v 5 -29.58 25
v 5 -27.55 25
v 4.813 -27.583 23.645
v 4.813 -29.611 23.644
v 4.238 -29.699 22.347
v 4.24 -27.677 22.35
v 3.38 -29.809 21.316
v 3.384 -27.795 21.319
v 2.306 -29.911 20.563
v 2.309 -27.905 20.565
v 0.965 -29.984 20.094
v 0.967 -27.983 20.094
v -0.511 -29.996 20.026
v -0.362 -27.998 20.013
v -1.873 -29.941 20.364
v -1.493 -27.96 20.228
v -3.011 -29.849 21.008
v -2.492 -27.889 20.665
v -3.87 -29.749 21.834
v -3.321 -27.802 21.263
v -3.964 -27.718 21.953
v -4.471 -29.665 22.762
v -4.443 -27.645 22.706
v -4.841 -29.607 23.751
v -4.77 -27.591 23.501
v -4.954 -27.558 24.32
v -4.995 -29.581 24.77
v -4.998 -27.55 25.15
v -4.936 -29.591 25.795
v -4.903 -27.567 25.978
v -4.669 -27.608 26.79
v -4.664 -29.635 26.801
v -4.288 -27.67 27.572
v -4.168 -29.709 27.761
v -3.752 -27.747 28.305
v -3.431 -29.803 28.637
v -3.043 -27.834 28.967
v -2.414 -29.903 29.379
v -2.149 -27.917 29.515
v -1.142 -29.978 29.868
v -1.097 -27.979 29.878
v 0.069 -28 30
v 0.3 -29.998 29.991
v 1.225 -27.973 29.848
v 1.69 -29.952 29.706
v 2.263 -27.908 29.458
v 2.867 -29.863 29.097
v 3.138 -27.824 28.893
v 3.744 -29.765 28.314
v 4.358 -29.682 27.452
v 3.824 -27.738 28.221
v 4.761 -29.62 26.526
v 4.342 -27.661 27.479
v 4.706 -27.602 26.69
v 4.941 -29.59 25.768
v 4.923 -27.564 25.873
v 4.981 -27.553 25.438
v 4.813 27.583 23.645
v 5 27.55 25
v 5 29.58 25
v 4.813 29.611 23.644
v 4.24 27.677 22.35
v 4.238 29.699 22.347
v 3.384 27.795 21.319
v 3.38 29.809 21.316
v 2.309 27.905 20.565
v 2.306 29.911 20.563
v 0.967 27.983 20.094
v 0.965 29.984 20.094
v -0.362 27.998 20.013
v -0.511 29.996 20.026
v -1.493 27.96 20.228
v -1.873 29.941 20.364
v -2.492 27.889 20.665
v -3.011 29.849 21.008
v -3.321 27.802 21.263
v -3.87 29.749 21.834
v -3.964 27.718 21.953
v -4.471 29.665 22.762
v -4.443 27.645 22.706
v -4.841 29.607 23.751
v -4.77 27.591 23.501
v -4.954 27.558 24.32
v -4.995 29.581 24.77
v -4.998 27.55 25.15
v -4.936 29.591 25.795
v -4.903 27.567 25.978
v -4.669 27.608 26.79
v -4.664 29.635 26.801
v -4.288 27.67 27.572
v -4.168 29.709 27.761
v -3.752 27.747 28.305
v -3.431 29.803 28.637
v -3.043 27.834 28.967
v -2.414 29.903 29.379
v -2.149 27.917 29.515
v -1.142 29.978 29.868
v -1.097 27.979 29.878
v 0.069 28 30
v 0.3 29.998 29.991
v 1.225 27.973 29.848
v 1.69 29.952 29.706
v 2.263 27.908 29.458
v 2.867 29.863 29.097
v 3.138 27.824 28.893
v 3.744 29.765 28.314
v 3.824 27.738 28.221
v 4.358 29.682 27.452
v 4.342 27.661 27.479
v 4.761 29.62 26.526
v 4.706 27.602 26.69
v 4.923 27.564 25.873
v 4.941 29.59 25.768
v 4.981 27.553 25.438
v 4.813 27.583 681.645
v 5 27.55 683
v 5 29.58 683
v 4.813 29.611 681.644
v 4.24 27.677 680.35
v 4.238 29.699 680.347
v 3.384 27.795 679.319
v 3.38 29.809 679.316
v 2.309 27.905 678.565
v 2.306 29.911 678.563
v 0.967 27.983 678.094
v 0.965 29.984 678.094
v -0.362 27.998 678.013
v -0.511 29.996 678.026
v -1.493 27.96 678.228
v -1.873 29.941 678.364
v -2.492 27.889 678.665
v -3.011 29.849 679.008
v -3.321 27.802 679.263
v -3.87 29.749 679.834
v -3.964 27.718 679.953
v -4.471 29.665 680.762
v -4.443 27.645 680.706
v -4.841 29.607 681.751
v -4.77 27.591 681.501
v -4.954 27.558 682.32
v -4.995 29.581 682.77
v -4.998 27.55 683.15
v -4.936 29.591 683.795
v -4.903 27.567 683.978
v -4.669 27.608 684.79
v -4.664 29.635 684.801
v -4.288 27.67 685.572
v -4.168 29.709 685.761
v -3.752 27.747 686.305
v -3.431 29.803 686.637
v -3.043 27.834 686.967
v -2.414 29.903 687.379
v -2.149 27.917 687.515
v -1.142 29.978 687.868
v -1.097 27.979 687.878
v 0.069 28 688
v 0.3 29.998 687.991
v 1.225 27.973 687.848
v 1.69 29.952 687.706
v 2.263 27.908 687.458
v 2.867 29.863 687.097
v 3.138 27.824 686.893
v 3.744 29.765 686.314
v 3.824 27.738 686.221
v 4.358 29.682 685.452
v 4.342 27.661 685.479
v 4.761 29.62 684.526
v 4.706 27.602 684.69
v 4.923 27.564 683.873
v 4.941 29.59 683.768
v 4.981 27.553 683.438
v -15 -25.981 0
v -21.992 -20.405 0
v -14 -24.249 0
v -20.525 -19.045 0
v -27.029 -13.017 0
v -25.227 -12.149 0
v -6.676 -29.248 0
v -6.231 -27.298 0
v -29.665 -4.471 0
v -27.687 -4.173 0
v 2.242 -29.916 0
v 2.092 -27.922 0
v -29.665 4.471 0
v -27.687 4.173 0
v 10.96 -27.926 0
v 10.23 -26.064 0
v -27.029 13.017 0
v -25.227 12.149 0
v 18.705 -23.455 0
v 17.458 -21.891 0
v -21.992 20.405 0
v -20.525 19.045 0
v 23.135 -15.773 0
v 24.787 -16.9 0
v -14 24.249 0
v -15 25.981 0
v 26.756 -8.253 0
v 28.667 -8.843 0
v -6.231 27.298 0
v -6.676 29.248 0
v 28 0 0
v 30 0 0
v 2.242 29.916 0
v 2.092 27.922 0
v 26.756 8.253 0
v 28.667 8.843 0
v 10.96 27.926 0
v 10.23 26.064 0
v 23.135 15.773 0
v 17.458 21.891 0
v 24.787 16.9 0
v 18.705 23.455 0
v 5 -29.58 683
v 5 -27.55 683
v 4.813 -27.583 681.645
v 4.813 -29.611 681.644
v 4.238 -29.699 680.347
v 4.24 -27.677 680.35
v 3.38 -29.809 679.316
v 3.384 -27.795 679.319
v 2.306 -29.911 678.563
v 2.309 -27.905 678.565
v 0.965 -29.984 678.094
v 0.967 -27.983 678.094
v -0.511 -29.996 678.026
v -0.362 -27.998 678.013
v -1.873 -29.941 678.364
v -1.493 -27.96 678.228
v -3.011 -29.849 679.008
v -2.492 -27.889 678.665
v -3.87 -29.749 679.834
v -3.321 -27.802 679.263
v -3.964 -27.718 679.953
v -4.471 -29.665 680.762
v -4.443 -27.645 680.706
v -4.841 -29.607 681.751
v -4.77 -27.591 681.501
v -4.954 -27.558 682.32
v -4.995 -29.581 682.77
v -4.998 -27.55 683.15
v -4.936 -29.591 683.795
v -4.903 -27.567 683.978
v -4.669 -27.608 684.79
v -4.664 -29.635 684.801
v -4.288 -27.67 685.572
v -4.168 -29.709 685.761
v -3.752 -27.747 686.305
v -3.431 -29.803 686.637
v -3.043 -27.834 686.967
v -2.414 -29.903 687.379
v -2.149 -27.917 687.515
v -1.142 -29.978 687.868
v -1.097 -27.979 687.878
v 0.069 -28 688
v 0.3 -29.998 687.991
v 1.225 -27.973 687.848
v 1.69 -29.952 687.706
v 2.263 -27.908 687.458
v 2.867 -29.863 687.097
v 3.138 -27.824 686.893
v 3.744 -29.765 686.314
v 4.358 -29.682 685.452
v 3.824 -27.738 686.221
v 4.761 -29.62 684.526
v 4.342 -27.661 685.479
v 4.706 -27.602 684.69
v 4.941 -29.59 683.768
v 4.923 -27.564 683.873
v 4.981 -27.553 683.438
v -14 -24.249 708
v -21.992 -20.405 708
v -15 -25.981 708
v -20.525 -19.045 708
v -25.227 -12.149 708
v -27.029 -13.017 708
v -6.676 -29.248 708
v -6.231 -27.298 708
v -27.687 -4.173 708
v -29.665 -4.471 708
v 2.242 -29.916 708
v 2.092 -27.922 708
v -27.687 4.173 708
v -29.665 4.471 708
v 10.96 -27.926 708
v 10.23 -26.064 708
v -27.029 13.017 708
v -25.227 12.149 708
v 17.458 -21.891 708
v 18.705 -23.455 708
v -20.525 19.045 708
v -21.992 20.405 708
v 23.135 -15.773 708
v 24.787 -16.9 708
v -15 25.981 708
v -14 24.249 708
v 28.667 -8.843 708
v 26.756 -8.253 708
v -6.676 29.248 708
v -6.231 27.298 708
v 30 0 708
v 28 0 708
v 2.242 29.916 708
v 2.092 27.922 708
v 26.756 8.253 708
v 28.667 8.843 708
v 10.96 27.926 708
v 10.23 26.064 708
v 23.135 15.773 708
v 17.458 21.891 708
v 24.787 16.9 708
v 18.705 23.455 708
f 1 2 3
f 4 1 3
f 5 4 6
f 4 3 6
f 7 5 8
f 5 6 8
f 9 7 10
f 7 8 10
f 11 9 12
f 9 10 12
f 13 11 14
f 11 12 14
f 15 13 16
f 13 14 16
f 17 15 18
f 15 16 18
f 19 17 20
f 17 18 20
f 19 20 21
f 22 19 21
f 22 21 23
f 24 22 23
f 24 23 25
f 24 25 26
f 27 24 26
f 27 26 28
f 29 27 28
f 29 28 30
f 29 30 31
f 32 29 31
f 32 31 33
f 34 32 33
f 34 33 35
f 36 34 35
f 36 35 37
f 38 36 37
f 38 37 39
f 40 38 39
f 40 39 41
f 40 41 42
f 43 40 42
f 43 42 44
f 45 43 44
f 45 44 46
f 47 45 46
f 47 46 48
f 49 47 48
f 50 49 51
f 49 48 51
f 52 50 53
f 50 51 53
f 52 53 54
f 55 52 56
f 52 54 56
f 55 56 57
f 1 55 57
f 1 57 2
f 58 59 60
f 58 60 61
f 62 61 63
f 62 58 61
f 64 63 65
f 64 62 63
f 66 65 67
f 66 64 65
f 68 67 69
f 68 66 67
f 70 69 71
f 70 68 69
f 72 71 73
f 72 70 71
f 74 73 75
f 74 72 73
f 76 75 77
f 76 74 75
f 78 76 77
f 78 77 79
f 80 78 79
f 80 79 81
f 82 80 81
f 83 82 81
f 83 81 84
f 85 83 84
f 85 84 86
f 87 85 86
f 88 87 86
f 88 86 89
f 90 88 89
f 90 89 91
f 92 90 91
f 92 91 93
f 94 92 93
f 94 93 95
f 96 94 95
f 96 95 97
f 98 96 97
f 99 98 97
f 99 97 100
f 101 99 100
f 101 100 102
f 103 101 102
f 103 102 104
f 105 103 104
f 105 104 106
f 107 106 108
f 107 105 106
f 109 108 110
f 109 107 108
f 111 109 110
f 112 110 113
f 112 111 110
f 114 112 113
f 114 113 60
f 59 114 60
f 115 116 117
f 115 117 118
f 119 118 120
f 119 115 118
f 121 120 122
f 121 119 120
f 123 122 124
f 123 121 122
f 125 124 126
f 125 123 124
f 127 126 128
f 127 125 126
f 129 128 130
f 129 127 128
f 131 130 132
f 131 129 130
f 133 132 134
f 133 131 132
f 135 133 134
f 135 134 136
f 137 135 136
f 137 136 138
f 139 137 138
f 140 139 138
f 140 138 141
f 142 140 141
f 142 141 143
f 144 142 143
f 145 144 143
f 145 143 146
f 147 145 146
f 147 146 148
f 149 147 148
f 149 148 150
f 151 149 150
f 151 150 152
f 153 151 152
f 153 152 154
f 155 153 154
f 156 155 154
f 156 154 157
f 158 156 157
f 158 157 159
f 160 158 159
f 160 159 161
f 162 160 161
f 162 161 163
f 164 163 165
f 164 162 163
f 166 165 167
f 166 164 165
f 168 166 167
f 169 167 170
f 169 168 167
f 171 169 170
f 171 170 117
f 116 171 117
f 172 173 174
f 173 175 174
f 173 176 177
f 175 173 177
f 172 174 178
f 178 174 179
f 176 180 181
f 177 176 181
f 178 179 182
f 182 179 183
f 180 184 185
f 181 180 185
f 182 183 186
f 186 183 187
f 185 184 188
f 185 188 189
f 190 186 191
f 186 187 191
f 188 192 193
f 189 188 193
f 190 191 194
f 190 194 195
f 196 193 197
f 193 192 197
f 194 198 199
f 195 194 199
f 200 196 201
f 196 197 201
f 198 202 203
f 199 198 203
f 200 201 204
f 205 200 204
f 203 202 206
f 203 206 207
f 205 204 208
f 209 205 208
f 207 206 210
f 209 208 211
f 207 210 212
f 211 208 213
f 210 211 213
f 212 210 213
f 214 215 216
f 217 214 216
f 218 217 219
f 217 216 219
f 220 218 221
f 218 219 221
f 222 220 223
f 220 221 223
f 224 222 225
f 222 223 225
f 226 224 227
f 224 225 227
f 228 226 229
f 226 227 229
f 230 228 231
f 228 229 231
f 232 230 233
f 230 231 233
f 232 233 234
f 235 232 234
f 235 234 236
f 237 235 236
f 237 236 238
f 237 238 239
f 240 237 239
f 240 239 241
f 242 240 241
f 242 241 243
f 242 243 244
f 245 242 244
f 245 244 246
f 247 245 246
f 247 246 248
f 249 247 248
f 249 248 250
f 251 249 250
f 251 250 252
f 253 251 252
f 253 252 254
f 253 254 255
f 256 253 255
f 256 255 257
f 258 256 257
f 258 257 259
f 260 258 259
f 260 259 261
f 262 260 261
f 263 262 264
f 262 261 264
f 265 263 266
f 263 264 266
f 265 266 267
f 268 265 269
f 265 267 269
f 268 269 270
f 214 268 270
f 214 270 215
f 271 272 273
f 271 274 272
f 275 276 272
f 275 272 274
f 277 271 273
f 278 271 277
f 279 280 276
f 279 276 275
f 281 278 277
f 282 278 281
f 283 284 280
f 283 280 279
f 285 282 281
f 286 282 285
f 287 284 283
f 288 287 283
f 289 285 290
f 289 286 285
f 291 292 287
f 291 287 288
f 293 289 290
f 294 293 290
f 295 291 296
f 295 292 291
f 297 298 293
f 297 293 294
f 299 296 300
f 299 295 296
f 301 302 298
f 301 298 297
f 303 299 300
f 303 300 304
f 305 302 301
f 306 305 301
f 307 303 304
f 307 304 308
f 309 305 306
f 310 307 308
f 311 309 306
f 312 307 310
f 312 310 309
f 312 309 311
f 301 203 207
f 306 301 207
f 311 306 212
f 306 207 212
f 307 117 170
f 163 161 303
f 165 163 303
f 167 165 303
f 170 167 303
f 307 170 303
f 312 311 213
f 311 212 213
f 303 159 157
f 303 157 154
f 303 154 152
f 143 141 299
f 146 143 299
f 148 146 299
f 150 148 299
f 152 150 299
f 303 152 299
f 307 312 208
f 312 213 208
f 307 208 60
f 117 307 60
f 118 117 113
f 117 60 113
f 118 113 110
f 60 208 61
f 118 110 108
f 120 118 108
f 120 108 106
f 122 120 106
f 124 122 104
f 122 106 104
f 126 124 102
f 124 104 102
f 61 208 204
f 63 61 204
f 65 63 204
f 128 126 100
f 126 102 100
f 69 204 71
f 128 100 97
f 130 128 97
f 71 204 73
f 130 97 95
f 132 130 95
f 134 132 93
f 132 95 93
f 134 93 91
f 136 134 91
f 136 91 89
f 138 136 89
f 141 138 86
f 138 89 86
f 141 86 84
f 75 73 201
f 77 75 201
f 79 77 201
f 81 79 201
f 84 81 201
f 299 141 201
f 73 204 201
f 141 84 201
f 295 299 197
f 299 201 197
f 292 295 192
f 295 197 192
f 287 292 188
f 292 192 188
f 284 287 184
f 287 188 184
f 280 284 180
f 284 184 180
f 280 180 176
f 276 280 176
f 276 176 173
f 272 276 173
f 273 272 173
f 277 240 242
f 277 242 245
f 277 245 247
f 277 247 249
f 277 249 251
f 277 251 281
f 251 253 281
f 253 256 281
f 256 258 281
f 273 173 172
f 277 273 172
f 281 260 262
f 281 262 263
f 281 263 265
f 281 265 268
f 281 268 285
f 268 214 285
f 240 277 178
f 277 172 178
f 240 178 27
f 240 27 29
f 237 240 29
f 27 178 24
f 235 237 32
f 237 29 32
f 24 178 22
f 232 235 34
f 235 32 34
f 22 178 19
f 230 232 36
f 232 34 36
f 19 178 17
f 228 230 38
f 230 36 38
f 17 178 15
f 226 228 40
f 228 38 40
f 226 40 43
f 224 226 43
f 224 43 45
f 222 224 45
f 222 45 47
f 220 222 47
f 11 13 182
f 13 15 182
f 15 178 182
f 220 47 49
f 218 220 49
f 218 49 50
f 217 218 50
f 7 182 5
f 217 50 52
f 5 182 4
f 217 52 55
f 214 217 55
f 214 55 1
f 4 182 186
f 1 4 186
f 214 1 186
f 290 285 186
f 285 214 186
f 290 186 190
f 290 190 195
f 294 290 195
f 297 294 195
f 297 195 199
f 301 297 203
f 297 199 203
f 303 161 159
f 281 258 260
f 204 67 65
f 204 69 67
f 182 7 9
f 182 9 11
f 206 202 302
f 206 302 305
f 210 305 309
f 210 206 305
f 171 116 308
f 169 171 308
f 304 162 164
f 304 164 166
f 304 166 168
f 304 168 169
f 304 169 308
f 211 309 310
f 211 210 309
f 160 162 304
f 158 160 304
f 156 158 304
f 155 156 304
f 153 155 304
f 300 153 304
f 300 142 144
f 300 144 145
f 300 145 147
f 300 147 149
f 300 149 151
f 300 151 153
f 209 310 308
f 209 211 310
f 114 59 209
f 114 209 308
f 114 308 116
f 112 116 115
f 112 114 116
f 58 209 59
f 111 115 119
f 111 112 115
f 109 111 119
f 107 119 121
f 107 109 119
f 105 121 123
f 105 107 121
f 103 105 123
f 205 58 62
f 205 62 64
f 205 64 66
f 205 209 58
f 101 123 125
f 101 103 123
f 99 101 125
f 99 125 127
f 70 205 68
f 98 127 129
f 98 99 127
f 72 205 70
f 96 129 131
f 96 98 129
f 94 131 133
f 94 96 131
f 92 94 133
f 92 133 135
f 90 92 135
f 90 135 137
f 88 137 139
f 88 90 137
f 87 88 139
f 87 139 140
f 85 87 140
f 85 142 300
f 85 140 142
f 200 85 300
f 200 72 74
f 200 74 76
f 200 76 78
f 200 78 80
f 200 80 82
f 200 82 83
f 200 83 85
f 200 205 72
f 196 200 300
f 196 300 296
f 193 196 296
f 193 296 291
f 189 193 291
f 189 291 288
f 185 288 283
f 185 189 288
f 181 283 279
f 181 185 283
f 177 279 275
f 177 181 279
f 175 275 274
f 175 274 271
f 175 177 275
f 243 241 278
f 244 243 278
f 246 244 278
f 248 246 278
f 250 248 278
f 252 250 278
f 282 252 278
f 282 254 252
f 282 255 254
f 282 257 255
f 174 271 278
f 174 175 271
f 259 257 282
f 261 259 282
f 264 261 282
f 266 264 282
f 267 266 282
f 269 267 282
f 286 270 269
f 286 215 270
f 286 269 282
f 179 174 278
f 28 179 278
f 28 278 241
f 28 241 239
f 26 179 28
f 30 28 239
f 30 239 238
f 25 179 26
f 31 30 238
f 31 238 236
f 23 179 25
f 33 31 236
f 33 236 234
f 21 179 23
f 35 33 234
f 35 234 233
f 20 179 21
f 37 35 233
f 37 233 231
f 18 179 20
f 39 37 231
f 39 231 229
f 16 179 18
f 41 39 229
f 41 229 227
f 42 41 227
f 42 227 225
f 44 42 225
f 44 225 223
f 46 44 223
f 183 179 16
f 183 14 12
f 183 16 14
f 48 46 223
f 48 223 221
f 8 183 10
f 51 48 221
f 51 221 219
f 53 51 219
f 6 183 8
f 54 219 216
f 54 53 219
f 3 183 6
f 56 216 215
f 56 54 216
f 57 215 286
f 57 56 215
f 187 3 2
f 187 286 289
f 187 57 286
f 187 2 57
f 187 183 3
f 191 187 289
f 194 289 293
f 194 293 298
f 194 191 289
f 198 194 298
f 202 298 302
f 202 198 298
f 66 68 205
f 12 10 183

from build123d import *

# Parameters (mm, degrees)
SKETCH1_R               = 30
SKETCH1_R_2             = 28
BOSS_EXTRUDE1_DEPTH     = 708
SKETCH2_R               = 5
CUT_EXTRUDE1_DEPTH      = 31
CUT_EXTRUDE1_DEPTH_BACK = 31


with BuildPart() as part:
    # Sketch1 → Boss-Extrude1 (new body)
    with BuildSketch(Plane.XY):
        Circle(SKETCH1_R)
        Circle(SKETCH1_R_2, mode=Mode.SUBTRACT)
    extrude(amount=BOSS_EXTRUDE1_DEPTH)

    # Sketch2 → Cut-Extrude1 (cut, two sides)
    with BuildSketch(Plane(origin=(0, 0, 0), x_dir=(1, 0, 0), z_dir=(0, 1, 0))) as cut_extrude1_sk:
        with Locations((0, -683)):
            Circle(SKETCH2_R)
        with Locations((0, -25)):
            Circle(SKETCH2_R)
    extrude(amount=CUT_EXTRUDE1_DEPTH, mode=Mode.SUBTRACT)
    extrude(cut_extrude1_sk.sketch, amount=-CUT_EXTRUDE1_DEPTH_BACK, mode=Mode.SUBTRACT)


solid = part.part
